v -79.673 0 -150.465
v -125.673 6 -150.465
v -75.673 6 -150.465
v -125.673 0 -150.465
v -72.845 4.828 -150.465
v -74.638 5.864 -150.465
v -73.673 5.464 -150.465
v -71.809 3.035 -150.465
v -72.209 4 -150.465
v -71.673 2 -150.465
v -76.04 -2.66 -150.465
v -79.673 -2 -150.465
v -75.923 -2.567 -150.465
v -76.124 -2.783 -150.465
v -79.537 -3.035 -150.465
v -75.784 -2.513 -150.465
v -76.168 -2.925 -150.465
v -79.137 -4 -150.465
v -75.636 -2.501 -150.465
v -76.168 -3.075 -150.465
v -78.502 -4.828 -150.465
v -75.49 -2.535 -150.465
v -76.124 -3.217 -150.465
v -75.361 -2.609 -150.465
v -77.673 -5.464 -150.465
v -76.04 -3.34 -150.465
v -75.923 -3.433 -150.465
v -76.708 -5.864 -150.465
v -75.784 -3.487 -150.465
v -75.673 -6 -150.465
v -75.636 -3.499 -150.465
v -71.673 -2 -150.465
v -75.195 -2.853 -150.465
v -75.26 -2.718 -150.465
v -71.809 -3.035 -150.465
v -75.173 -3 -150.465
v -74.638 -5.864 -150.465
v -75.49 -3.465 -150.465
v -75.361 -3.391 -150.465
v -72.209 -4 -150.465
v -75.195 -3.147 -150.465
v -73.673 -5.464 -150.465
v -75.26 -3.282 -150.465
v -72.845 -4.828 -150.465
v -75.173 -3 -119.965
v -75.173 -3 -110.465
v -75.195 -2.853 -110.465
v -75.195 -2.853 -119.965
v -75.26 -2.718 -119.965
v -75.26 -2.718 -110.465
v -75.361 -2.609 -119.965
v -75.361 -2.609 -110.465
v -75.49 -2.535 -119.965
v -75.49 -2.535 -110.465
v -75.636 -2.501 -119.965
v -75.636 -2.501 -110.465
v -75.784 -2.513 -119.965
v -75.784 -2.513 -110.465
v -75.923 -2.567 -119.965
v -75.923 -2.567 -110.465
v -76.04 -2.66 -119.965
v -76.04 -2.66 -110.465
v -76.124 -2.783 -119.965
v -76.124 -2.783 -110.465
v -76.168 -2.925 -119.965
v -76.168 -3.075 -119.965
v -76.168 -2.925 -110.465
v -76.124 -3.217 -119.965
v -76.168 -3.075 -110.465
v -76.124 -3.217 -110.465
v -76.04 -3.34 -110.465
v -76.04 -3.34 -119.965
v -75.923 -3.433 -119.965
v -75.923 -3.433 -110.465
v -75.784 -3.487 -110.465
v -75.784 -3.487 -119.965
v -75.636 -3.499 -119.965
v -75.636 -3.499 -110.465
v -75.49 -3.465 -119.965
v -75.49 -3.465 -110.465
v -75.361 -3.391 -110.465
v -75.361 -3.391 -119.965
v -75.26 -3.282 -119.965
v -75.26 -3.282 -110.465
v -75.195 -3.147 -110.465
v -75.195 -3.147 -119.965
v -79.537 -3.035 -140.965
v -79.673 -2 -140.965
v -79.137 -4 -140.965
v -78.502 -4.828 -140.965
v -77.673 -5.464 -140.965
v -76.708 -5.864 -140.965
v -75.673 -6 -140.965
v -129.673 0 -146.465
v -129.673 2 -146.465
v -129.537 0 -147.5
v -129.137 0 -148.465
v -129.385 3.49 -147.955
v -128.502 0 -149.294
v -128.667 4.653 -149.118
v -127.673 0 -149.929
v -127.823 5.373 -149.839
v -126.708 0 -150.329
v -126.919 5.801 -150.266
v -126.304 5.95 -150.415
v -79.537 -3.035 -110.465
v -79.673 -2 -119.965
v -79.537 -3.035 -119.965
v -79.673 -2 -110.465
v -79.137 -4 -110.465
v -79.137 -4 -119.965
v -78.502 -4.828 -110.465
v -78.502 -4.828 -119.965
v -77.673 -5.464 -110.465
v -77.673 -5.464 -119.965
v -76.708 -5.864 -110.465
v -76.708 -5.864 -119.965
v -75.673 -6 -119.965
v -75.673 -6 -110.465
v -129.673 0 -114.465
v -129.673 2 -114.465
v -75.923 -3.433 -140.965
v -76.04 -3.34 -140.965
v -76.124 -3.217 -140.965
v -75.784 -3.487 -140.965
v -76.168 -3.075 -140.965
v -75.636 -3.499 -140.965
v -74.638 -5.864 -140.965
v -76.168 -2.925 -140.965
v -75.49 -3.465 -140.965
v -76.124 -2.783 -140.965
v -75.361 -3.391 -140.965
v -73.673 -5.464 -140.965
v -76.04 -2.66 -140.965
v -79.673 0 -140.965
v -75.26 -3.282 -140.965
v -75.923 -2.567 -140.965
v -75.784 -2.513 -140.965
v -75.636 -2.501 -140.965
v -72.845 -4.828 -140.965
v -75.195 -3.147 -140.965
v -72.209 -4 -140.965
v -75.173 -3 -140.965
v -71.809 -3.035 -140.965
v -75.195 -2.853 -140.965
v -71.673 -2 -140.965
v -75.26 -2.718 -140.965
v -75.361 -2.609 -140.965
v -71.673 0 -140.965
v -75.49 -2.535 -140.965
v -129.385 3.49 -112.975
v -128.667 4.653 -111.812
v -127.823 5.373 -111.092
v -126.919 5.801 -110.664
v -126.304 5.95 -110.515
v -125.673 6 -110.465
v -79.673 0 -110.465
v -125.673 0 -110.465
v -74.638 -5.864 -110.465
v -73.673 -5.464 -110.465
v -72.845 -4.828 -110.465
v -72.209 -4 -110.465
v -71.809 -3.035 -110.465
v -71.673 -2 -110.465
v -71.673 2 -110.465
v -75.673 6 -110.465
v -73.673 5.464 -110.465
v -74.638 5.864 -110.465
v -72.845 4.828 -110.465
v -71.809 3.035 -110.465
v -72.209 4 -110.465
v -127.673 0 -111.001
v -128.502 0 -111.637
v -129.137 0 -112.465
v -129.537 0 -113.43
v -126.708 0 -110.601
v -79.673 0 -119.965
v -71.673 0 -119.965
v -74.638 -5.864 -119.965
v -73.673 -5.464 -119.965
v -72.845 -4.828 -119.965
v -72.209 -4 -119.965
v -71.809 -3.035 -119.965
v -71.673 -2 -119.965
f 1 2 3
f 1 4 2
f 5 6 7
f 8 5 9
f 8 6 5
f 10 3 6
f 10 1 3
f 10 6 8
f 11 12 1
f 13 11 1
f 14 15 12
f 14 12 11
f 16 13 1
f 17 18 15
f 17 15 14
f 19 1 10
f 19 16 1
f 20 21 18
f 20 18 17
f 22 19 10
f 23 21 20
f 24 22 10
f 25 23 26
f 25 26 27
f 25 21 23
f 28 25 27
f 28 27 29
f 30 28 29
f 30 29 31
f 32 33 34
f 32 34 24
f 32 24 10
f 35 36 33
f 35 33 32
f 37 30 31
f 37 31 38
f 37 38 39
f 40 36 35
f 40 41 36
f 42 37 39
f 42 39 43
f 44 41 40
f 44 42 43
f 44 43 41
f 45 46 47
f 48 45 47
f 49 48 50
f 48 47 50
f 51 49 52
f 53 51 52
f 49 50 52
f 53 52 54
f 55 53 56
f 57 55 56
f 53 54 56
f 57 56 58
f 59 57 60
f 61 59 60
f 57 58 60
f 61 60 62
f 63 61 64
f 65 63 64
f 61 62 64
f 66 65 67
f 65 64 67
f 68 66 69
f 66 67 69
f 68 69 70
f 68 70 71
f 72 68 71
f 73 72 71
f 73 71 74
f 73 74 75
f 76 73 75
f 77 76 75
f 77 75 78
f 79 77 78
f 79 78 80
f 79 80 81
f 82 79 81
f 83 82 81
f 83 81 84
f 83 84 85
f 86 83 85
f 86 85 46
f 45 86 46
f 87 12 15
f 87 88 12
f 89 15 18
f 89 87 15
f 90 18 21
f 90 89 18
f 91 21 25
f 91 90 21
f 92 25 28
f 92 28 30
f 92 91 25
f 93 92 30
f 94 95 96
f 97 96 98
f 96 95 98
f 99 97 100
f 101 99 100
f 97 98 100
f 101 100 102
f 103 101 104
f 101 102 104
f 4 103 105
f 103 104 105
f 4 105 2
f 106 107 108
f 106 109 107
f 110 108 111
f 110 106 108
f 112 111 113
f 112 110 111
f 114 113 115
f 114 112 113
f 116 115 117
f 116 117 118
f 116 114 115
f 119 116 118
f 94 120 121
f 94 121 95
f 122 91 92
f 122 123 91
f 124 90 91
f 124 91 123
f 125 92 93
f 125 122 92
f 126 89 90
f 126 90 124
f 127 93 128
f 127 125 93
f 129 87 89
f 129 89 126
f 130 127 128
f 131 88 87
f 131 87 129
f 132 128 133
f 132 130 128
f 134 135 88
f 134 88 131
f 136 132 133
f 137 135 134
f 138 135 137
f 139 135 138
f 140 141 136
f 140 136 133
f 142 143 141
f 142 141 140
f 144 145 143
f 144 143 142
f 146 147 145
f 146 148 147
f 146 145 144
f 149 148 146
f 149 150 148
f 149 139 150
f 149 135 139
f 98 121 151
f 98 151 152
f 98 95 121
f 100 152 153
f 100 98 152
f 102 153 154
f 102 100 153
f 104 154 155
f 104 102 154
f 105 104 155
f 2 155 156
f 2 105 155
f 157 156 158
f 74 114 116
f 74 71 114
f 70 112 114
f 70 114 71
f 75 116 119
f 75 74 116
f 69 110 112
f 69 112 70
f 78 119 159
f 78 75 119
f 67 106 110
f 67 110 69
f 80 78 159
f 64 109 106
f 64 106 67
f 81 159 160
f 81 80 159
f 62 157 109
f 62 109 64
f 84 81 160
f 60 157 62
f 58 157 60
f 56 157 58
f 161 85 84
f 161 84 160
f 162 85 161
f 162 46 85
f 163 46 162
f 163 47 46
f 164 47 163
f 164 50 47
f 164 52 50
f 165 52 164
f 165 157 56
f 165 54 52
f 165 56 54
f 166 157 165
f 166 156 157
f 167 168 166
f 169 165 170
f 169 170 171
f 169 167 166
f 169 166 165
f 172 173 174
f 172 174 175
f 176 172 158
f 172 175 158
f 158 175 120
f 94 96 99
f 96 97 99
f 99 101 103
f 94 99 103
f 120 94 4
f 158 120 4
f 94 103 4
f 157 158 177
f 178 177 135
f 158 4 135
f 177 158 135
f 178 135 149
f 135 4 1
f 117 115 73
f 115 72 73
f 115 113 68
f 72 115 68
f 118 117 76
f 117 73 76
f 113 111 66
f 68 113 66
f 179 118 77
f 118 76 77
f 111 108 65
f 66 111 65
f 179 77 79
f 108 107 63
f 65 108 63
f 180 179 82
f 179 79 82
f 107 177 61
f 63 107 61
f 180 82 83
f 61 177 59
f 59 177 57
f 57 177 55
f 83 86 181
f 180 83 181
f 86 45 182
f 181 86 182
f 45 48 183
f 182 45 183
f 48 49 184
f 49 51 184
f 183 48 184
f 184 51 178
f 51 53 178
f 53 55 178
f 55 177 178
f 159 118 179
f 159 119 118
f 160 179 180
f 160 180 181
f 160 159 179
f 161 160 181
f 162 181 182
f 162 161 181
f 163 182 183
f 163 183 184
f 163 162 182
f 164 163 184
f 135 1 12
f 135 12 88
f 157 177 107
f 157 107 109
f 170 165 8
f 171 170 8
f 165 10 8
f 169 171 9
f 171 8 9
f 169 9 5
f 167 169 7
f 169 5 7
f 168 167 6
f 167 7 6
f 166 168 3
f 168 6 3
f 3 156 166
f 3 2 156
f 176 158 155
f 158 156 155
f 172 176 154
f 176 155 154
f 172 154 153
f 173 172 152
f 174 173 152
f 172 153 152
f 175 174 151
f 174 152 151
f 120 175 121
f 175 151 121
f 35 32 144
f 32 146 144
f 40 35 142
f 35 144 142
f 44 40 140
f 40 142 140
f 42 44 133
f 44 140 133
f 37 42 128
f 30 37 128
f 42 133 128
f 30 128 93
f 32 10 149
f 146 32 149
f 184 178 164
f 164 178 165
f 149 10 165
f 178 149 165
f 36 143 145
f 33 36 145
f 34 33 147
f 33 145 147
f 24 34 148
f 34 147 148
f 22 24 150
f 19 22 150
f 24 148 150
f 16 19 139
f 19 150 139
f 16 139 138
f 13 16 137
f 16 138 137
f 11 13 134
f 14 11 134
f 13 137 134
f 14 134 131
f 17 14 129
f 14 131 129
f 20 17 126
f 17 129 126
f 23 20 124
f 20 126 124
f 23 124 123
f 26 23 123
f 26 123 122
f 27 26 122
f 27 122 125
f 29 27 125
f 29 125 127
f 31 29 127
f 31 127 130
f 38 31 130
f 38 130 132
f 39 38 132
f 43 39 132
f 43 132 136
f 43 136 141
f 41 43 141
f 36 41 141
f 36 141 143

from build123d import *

# Parameters (mm, degrees)
SKETCH_5_W          = 58
SKETCH_5_H          = 40
EXTRUDE_3_DEPTH     = 6
SKETCH_6_W          = 8
SKETCH_6_H          = 9.5
EXTRUDE_4_DEPTH     = 6
CUT_EXTRUDE_2_REACH = 137.835
SKETCH_7_R          = 0.5
FILLET_4_R          = 4
FILLET_5_R          = 4


with BuildPart() as part:
    # Эскиз5 → Бобышка-Вытянуть3 (new body)
    with BuildSketch(Plane(origin=(0, 0, 0), x_dir=(1, 0, 0), z_dir=(0, 1, 0))):
        with Locations((-100.673147531, 130.465154765)):
            Rectangle(SKETCH_5_W, SKETCH_5_H)
    extrude(amount=EXTRUDE_3_DEPTH)

    # Эскиз6 → Бобышка-Вытянуть4 (add)
    with BuildSketch(Plane.XZ):
        with Locations((-75.673147531, -115.215154765)):
            Rectangle(SKETCH_6_W, SKETCH_6_H)
        with Locations((-75.673147531, -145.715154765)):
            Rectangle(SKETCH_6_W, SKETCH_6_H)
    extrude(amount=EXTRUDE_4_DEPTH)

    # Вырез-Вытянуть2: up to this face of the body (flat: up to its plane)
    cut_extrude_2_end = Plane(part.part.faces().sort_by_distance((-97.642844501, 2.272727273, -150.465154765))[0])
    # Эскиз7 → Вырез-Вытянуть2 (cut, up to the picked face)
    with BuildSketch(Plane.XY.offset(-110.465154765), mode=Mode.PRIVATE) as cut_extrude_2_sk1:
        with Locations((-75.673147531, -3)):
            Circle(SKETCH_7_R)
    cut_extrude_2_tool1 = split(extrude(cut_extrude_2_sk1.sketch, amount=-CUT_EXTRUDE_2_REACH, mode=Mode.PRIVATE), bisect_by=cut_extrude_2_end, keep=Keep.BOTH, mode=Mode.PRIVATE)
    add(cut_extrude_2_tool1.solids().sort_by(Axis((-75.673148, -3, -110.465155), (0, 0, -1)))[0], mode=Mode.SUBTRACT)

    # Скругление4
    fillet_4_edges = [part.edges().sort_by_distance(p)[0] for p in [
        (-71.673147531, 6, -130.465154765),
        (-71.673147531, -6, -145.715154765),
        (-79.673147531, -6, -145.715154765),
        (-71.673147531, -6, -115.215154765),
        (-79.673147531, -6, -115.215154765),
    ]]
    fillet(fillet_4_edges, radius=FILLET_4_R - 0.0001)  # a hair under: the kernel refuses the full size

    # Скругление5
    fillet_5_edges = [part.edges().sort_by_distance(p)[0] for p in [
        (-129.673147531, 6, -130.465154765),
        (-129.673147531, 3, -110.465154765),
        (-129.673147531, 3, -150.465154765),
    ]]
    fillet(fillet_5_edges, radius=FILLET_5_R)


solid = part.part
